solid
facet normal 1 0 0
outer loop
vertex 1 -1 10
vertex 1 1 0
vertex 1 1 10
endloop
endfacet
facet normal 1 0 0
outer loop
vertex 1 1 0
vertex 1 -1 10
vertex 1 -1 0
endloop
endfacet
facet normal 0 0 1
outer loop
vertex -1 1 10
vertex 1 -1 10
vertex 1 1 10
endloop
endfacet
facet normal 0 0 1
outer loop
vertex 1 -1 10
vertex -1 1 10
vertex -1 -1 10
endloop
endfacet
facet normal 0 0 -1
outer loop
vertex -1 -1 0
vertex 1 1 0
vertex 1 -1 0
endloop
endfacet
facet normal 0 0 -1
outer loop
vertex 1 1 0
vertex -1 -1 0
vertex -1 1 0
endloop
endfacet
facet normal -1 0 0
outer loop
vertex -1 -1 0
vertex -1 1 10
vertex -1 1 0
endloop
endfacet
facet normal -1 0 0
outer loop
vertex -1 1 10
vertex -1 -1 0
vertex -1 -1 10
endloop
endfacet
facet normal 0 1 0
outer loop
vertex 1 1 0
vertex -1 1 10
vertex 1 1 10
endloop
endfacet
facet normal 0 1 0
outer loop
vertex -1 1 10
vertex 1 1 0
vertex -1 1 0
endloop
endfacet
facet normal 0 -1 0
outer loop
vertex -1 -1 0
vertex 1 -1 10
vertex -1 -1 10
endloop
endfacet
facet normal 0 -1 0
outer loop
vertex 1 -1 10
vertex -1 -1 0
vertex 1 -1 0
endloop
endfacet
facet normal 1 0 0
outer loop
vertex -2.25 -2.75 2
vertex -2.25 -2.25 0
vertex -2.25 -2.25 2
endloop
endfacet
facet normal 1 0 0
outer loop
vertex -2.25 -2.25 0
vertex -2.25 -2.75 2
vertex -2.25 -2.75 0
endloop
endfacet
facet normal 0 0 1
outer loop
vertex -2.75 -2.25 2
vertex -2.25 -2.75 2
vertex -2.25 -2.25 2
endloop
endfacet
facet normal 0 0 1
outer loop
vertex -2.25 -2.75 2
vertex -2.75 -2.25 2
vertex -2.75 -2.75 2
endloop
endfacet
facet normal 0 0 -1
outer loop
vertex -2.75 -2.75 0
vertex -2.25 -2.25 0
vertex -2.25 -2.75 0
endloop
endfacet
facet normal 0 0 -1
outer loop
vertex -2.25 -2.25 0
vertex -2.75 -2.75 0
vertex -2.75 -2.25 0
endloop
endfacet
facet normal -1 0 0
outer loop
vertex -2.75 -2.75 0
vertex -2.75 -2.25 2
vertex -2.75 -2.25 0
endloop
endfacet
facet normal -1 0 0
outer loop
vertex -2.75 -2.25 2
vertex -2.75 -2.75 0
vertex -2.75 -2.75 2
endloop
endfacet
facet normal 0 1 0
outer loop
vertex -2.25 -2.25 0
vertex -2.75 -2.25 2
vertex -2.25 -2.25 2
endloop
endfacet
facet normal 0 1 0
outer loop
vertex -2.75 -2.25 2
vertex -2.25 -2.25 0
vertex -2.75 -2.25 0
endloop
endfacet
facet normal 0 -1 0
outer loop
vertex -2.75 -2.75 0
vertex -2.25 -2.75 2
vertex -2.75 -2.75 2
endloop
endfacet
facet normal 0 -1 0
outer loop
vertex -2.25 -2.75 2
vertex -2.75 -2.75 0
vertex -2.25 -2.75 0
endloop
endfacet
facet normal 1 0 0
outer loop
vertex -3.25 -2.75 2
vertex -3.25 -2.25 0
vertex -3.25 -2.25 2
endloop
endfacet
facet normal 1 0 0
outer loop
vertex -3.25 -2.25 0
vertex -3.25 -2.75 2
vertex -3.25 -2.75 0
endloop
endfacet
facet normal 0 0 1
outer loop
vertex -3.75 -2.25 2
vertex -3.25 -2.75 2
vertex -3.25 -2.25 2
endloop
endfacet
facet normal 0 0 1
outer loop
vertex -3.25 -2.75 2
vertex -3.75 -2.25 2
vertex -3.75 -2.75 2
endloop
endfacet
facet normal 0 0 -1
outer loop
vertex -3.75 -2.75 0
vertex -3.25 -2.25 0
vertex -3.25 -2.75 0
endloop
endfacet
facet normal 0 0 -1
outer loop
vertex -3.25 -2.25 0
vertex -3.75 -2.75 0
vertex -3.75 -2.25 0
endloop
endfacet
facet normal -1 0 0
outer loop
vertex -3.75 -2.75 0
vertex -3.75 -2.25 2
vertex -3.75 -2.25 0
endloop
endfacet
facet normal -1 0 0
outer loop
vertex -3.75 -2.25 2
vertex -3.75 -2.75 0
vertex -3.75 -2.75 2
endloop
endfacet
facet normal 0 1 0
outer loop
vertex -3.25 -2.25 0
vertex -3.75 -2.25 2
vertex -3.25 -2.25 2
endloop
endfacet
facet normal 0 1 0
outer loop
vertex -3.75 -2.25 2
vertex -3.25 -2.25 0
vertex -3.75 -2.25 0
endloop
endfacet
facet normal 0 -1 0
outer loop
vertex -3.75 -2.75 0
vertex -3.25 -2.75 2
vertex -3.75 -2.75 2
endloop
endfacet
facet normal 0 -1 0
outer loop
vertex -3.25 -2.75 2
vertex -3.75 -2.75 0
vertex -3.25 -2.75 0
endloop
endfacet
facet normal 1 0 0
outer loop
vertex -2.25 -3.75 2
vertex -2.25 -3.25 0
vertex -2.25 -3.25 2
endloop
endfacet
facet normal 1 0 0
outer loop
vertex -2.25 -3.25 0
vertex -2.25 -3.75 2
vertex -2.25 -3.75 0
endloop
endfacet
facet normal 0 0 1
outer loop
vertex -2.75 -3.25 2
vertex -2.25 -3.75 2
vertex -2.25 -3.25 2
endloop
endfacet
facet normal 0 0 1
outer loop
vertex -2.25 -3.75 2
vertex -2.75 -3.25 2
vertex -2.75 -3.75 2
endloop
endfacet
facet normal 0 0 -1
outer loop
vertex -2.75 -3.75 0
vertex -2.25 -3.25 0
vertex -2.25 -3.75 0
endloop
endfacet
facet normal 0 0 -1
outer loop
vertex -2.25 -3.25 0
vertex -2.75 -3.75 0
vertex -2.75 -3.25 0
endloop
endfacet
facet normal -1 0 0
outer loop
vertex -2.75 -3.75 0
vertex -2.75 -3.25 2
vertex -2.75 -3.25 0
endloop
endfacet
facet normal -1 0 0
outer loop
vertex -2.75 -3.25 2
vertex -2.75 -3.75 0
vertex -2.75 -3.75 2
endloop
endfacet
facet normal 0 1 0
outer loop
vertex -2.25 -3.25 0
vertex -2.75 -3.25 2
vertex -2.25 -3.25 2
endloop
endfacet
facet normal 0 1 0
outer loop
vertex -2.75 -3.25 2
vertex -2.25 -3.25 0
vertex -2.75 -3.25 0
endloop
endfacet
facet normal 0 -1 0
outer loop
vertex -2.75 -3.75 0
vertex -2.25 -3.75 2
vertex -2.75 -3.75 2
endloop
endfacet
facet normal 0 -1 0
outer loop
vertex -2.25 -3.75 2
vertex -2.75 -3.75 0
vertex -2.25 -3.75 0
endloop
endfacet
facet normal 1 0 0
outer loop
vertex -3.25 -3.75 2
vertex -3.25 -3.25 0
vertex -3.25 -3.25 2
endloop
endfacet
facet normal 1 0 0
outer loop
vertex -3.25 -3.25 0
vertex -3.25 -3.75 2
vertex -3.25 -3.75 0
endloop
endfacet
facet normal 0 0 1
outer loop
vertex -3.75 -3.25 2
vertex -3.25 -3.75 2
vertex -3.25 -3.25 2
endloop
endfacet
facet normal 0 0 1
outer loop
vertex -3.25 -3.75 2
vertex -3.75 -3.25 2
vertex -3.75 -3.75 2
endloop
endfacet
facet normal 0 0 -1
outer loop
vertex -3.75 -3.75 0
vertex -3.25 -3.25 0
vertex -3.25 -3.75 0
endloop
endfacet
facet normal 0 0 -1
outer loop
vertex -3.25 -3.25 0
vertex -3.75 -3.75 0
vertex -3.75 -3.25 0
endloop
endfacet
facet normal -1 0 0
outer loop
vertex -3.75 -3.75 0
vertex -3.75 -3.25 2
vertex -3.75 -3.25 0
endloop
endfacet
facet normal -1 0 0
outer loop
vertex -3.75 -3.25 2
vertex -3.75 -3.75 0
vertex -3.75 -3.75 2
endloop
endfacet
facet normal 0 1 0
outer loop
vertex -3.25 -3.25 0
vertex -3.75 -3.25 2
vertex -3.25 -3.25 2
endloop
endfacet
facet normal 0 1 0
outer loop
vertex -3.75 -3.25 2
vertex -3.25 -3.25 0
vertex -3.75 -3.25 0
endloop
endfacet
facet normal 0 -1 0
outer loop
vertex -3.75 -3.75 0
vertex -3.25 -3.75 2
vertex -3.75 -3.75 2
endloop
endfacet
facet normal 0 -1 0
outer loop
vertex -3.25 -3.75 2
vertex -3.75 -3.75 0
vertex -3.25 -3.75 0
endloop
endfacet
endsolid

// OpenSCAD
translate([0, 0, 5]) color([0,1,0,0.9]) cube([2, 2, 10], center=true);
translate([-2.5, -2.5, 1]) color([1,0,0]) cube([0.5, 0.5, 2], center=true);
translate([-3.5, -2.5, 1]) color([1,0,0]) cube([0.5, 0.5, 2], center=true);
translate([-2.5, -3.5, 1]) color([1,0,0]) cube([0.5, 0.5, 2], center=true);
translate([-3.5, -3.5, 1]) color([1,0,0]) cube([0.5, 0.5, 2], center=true);
